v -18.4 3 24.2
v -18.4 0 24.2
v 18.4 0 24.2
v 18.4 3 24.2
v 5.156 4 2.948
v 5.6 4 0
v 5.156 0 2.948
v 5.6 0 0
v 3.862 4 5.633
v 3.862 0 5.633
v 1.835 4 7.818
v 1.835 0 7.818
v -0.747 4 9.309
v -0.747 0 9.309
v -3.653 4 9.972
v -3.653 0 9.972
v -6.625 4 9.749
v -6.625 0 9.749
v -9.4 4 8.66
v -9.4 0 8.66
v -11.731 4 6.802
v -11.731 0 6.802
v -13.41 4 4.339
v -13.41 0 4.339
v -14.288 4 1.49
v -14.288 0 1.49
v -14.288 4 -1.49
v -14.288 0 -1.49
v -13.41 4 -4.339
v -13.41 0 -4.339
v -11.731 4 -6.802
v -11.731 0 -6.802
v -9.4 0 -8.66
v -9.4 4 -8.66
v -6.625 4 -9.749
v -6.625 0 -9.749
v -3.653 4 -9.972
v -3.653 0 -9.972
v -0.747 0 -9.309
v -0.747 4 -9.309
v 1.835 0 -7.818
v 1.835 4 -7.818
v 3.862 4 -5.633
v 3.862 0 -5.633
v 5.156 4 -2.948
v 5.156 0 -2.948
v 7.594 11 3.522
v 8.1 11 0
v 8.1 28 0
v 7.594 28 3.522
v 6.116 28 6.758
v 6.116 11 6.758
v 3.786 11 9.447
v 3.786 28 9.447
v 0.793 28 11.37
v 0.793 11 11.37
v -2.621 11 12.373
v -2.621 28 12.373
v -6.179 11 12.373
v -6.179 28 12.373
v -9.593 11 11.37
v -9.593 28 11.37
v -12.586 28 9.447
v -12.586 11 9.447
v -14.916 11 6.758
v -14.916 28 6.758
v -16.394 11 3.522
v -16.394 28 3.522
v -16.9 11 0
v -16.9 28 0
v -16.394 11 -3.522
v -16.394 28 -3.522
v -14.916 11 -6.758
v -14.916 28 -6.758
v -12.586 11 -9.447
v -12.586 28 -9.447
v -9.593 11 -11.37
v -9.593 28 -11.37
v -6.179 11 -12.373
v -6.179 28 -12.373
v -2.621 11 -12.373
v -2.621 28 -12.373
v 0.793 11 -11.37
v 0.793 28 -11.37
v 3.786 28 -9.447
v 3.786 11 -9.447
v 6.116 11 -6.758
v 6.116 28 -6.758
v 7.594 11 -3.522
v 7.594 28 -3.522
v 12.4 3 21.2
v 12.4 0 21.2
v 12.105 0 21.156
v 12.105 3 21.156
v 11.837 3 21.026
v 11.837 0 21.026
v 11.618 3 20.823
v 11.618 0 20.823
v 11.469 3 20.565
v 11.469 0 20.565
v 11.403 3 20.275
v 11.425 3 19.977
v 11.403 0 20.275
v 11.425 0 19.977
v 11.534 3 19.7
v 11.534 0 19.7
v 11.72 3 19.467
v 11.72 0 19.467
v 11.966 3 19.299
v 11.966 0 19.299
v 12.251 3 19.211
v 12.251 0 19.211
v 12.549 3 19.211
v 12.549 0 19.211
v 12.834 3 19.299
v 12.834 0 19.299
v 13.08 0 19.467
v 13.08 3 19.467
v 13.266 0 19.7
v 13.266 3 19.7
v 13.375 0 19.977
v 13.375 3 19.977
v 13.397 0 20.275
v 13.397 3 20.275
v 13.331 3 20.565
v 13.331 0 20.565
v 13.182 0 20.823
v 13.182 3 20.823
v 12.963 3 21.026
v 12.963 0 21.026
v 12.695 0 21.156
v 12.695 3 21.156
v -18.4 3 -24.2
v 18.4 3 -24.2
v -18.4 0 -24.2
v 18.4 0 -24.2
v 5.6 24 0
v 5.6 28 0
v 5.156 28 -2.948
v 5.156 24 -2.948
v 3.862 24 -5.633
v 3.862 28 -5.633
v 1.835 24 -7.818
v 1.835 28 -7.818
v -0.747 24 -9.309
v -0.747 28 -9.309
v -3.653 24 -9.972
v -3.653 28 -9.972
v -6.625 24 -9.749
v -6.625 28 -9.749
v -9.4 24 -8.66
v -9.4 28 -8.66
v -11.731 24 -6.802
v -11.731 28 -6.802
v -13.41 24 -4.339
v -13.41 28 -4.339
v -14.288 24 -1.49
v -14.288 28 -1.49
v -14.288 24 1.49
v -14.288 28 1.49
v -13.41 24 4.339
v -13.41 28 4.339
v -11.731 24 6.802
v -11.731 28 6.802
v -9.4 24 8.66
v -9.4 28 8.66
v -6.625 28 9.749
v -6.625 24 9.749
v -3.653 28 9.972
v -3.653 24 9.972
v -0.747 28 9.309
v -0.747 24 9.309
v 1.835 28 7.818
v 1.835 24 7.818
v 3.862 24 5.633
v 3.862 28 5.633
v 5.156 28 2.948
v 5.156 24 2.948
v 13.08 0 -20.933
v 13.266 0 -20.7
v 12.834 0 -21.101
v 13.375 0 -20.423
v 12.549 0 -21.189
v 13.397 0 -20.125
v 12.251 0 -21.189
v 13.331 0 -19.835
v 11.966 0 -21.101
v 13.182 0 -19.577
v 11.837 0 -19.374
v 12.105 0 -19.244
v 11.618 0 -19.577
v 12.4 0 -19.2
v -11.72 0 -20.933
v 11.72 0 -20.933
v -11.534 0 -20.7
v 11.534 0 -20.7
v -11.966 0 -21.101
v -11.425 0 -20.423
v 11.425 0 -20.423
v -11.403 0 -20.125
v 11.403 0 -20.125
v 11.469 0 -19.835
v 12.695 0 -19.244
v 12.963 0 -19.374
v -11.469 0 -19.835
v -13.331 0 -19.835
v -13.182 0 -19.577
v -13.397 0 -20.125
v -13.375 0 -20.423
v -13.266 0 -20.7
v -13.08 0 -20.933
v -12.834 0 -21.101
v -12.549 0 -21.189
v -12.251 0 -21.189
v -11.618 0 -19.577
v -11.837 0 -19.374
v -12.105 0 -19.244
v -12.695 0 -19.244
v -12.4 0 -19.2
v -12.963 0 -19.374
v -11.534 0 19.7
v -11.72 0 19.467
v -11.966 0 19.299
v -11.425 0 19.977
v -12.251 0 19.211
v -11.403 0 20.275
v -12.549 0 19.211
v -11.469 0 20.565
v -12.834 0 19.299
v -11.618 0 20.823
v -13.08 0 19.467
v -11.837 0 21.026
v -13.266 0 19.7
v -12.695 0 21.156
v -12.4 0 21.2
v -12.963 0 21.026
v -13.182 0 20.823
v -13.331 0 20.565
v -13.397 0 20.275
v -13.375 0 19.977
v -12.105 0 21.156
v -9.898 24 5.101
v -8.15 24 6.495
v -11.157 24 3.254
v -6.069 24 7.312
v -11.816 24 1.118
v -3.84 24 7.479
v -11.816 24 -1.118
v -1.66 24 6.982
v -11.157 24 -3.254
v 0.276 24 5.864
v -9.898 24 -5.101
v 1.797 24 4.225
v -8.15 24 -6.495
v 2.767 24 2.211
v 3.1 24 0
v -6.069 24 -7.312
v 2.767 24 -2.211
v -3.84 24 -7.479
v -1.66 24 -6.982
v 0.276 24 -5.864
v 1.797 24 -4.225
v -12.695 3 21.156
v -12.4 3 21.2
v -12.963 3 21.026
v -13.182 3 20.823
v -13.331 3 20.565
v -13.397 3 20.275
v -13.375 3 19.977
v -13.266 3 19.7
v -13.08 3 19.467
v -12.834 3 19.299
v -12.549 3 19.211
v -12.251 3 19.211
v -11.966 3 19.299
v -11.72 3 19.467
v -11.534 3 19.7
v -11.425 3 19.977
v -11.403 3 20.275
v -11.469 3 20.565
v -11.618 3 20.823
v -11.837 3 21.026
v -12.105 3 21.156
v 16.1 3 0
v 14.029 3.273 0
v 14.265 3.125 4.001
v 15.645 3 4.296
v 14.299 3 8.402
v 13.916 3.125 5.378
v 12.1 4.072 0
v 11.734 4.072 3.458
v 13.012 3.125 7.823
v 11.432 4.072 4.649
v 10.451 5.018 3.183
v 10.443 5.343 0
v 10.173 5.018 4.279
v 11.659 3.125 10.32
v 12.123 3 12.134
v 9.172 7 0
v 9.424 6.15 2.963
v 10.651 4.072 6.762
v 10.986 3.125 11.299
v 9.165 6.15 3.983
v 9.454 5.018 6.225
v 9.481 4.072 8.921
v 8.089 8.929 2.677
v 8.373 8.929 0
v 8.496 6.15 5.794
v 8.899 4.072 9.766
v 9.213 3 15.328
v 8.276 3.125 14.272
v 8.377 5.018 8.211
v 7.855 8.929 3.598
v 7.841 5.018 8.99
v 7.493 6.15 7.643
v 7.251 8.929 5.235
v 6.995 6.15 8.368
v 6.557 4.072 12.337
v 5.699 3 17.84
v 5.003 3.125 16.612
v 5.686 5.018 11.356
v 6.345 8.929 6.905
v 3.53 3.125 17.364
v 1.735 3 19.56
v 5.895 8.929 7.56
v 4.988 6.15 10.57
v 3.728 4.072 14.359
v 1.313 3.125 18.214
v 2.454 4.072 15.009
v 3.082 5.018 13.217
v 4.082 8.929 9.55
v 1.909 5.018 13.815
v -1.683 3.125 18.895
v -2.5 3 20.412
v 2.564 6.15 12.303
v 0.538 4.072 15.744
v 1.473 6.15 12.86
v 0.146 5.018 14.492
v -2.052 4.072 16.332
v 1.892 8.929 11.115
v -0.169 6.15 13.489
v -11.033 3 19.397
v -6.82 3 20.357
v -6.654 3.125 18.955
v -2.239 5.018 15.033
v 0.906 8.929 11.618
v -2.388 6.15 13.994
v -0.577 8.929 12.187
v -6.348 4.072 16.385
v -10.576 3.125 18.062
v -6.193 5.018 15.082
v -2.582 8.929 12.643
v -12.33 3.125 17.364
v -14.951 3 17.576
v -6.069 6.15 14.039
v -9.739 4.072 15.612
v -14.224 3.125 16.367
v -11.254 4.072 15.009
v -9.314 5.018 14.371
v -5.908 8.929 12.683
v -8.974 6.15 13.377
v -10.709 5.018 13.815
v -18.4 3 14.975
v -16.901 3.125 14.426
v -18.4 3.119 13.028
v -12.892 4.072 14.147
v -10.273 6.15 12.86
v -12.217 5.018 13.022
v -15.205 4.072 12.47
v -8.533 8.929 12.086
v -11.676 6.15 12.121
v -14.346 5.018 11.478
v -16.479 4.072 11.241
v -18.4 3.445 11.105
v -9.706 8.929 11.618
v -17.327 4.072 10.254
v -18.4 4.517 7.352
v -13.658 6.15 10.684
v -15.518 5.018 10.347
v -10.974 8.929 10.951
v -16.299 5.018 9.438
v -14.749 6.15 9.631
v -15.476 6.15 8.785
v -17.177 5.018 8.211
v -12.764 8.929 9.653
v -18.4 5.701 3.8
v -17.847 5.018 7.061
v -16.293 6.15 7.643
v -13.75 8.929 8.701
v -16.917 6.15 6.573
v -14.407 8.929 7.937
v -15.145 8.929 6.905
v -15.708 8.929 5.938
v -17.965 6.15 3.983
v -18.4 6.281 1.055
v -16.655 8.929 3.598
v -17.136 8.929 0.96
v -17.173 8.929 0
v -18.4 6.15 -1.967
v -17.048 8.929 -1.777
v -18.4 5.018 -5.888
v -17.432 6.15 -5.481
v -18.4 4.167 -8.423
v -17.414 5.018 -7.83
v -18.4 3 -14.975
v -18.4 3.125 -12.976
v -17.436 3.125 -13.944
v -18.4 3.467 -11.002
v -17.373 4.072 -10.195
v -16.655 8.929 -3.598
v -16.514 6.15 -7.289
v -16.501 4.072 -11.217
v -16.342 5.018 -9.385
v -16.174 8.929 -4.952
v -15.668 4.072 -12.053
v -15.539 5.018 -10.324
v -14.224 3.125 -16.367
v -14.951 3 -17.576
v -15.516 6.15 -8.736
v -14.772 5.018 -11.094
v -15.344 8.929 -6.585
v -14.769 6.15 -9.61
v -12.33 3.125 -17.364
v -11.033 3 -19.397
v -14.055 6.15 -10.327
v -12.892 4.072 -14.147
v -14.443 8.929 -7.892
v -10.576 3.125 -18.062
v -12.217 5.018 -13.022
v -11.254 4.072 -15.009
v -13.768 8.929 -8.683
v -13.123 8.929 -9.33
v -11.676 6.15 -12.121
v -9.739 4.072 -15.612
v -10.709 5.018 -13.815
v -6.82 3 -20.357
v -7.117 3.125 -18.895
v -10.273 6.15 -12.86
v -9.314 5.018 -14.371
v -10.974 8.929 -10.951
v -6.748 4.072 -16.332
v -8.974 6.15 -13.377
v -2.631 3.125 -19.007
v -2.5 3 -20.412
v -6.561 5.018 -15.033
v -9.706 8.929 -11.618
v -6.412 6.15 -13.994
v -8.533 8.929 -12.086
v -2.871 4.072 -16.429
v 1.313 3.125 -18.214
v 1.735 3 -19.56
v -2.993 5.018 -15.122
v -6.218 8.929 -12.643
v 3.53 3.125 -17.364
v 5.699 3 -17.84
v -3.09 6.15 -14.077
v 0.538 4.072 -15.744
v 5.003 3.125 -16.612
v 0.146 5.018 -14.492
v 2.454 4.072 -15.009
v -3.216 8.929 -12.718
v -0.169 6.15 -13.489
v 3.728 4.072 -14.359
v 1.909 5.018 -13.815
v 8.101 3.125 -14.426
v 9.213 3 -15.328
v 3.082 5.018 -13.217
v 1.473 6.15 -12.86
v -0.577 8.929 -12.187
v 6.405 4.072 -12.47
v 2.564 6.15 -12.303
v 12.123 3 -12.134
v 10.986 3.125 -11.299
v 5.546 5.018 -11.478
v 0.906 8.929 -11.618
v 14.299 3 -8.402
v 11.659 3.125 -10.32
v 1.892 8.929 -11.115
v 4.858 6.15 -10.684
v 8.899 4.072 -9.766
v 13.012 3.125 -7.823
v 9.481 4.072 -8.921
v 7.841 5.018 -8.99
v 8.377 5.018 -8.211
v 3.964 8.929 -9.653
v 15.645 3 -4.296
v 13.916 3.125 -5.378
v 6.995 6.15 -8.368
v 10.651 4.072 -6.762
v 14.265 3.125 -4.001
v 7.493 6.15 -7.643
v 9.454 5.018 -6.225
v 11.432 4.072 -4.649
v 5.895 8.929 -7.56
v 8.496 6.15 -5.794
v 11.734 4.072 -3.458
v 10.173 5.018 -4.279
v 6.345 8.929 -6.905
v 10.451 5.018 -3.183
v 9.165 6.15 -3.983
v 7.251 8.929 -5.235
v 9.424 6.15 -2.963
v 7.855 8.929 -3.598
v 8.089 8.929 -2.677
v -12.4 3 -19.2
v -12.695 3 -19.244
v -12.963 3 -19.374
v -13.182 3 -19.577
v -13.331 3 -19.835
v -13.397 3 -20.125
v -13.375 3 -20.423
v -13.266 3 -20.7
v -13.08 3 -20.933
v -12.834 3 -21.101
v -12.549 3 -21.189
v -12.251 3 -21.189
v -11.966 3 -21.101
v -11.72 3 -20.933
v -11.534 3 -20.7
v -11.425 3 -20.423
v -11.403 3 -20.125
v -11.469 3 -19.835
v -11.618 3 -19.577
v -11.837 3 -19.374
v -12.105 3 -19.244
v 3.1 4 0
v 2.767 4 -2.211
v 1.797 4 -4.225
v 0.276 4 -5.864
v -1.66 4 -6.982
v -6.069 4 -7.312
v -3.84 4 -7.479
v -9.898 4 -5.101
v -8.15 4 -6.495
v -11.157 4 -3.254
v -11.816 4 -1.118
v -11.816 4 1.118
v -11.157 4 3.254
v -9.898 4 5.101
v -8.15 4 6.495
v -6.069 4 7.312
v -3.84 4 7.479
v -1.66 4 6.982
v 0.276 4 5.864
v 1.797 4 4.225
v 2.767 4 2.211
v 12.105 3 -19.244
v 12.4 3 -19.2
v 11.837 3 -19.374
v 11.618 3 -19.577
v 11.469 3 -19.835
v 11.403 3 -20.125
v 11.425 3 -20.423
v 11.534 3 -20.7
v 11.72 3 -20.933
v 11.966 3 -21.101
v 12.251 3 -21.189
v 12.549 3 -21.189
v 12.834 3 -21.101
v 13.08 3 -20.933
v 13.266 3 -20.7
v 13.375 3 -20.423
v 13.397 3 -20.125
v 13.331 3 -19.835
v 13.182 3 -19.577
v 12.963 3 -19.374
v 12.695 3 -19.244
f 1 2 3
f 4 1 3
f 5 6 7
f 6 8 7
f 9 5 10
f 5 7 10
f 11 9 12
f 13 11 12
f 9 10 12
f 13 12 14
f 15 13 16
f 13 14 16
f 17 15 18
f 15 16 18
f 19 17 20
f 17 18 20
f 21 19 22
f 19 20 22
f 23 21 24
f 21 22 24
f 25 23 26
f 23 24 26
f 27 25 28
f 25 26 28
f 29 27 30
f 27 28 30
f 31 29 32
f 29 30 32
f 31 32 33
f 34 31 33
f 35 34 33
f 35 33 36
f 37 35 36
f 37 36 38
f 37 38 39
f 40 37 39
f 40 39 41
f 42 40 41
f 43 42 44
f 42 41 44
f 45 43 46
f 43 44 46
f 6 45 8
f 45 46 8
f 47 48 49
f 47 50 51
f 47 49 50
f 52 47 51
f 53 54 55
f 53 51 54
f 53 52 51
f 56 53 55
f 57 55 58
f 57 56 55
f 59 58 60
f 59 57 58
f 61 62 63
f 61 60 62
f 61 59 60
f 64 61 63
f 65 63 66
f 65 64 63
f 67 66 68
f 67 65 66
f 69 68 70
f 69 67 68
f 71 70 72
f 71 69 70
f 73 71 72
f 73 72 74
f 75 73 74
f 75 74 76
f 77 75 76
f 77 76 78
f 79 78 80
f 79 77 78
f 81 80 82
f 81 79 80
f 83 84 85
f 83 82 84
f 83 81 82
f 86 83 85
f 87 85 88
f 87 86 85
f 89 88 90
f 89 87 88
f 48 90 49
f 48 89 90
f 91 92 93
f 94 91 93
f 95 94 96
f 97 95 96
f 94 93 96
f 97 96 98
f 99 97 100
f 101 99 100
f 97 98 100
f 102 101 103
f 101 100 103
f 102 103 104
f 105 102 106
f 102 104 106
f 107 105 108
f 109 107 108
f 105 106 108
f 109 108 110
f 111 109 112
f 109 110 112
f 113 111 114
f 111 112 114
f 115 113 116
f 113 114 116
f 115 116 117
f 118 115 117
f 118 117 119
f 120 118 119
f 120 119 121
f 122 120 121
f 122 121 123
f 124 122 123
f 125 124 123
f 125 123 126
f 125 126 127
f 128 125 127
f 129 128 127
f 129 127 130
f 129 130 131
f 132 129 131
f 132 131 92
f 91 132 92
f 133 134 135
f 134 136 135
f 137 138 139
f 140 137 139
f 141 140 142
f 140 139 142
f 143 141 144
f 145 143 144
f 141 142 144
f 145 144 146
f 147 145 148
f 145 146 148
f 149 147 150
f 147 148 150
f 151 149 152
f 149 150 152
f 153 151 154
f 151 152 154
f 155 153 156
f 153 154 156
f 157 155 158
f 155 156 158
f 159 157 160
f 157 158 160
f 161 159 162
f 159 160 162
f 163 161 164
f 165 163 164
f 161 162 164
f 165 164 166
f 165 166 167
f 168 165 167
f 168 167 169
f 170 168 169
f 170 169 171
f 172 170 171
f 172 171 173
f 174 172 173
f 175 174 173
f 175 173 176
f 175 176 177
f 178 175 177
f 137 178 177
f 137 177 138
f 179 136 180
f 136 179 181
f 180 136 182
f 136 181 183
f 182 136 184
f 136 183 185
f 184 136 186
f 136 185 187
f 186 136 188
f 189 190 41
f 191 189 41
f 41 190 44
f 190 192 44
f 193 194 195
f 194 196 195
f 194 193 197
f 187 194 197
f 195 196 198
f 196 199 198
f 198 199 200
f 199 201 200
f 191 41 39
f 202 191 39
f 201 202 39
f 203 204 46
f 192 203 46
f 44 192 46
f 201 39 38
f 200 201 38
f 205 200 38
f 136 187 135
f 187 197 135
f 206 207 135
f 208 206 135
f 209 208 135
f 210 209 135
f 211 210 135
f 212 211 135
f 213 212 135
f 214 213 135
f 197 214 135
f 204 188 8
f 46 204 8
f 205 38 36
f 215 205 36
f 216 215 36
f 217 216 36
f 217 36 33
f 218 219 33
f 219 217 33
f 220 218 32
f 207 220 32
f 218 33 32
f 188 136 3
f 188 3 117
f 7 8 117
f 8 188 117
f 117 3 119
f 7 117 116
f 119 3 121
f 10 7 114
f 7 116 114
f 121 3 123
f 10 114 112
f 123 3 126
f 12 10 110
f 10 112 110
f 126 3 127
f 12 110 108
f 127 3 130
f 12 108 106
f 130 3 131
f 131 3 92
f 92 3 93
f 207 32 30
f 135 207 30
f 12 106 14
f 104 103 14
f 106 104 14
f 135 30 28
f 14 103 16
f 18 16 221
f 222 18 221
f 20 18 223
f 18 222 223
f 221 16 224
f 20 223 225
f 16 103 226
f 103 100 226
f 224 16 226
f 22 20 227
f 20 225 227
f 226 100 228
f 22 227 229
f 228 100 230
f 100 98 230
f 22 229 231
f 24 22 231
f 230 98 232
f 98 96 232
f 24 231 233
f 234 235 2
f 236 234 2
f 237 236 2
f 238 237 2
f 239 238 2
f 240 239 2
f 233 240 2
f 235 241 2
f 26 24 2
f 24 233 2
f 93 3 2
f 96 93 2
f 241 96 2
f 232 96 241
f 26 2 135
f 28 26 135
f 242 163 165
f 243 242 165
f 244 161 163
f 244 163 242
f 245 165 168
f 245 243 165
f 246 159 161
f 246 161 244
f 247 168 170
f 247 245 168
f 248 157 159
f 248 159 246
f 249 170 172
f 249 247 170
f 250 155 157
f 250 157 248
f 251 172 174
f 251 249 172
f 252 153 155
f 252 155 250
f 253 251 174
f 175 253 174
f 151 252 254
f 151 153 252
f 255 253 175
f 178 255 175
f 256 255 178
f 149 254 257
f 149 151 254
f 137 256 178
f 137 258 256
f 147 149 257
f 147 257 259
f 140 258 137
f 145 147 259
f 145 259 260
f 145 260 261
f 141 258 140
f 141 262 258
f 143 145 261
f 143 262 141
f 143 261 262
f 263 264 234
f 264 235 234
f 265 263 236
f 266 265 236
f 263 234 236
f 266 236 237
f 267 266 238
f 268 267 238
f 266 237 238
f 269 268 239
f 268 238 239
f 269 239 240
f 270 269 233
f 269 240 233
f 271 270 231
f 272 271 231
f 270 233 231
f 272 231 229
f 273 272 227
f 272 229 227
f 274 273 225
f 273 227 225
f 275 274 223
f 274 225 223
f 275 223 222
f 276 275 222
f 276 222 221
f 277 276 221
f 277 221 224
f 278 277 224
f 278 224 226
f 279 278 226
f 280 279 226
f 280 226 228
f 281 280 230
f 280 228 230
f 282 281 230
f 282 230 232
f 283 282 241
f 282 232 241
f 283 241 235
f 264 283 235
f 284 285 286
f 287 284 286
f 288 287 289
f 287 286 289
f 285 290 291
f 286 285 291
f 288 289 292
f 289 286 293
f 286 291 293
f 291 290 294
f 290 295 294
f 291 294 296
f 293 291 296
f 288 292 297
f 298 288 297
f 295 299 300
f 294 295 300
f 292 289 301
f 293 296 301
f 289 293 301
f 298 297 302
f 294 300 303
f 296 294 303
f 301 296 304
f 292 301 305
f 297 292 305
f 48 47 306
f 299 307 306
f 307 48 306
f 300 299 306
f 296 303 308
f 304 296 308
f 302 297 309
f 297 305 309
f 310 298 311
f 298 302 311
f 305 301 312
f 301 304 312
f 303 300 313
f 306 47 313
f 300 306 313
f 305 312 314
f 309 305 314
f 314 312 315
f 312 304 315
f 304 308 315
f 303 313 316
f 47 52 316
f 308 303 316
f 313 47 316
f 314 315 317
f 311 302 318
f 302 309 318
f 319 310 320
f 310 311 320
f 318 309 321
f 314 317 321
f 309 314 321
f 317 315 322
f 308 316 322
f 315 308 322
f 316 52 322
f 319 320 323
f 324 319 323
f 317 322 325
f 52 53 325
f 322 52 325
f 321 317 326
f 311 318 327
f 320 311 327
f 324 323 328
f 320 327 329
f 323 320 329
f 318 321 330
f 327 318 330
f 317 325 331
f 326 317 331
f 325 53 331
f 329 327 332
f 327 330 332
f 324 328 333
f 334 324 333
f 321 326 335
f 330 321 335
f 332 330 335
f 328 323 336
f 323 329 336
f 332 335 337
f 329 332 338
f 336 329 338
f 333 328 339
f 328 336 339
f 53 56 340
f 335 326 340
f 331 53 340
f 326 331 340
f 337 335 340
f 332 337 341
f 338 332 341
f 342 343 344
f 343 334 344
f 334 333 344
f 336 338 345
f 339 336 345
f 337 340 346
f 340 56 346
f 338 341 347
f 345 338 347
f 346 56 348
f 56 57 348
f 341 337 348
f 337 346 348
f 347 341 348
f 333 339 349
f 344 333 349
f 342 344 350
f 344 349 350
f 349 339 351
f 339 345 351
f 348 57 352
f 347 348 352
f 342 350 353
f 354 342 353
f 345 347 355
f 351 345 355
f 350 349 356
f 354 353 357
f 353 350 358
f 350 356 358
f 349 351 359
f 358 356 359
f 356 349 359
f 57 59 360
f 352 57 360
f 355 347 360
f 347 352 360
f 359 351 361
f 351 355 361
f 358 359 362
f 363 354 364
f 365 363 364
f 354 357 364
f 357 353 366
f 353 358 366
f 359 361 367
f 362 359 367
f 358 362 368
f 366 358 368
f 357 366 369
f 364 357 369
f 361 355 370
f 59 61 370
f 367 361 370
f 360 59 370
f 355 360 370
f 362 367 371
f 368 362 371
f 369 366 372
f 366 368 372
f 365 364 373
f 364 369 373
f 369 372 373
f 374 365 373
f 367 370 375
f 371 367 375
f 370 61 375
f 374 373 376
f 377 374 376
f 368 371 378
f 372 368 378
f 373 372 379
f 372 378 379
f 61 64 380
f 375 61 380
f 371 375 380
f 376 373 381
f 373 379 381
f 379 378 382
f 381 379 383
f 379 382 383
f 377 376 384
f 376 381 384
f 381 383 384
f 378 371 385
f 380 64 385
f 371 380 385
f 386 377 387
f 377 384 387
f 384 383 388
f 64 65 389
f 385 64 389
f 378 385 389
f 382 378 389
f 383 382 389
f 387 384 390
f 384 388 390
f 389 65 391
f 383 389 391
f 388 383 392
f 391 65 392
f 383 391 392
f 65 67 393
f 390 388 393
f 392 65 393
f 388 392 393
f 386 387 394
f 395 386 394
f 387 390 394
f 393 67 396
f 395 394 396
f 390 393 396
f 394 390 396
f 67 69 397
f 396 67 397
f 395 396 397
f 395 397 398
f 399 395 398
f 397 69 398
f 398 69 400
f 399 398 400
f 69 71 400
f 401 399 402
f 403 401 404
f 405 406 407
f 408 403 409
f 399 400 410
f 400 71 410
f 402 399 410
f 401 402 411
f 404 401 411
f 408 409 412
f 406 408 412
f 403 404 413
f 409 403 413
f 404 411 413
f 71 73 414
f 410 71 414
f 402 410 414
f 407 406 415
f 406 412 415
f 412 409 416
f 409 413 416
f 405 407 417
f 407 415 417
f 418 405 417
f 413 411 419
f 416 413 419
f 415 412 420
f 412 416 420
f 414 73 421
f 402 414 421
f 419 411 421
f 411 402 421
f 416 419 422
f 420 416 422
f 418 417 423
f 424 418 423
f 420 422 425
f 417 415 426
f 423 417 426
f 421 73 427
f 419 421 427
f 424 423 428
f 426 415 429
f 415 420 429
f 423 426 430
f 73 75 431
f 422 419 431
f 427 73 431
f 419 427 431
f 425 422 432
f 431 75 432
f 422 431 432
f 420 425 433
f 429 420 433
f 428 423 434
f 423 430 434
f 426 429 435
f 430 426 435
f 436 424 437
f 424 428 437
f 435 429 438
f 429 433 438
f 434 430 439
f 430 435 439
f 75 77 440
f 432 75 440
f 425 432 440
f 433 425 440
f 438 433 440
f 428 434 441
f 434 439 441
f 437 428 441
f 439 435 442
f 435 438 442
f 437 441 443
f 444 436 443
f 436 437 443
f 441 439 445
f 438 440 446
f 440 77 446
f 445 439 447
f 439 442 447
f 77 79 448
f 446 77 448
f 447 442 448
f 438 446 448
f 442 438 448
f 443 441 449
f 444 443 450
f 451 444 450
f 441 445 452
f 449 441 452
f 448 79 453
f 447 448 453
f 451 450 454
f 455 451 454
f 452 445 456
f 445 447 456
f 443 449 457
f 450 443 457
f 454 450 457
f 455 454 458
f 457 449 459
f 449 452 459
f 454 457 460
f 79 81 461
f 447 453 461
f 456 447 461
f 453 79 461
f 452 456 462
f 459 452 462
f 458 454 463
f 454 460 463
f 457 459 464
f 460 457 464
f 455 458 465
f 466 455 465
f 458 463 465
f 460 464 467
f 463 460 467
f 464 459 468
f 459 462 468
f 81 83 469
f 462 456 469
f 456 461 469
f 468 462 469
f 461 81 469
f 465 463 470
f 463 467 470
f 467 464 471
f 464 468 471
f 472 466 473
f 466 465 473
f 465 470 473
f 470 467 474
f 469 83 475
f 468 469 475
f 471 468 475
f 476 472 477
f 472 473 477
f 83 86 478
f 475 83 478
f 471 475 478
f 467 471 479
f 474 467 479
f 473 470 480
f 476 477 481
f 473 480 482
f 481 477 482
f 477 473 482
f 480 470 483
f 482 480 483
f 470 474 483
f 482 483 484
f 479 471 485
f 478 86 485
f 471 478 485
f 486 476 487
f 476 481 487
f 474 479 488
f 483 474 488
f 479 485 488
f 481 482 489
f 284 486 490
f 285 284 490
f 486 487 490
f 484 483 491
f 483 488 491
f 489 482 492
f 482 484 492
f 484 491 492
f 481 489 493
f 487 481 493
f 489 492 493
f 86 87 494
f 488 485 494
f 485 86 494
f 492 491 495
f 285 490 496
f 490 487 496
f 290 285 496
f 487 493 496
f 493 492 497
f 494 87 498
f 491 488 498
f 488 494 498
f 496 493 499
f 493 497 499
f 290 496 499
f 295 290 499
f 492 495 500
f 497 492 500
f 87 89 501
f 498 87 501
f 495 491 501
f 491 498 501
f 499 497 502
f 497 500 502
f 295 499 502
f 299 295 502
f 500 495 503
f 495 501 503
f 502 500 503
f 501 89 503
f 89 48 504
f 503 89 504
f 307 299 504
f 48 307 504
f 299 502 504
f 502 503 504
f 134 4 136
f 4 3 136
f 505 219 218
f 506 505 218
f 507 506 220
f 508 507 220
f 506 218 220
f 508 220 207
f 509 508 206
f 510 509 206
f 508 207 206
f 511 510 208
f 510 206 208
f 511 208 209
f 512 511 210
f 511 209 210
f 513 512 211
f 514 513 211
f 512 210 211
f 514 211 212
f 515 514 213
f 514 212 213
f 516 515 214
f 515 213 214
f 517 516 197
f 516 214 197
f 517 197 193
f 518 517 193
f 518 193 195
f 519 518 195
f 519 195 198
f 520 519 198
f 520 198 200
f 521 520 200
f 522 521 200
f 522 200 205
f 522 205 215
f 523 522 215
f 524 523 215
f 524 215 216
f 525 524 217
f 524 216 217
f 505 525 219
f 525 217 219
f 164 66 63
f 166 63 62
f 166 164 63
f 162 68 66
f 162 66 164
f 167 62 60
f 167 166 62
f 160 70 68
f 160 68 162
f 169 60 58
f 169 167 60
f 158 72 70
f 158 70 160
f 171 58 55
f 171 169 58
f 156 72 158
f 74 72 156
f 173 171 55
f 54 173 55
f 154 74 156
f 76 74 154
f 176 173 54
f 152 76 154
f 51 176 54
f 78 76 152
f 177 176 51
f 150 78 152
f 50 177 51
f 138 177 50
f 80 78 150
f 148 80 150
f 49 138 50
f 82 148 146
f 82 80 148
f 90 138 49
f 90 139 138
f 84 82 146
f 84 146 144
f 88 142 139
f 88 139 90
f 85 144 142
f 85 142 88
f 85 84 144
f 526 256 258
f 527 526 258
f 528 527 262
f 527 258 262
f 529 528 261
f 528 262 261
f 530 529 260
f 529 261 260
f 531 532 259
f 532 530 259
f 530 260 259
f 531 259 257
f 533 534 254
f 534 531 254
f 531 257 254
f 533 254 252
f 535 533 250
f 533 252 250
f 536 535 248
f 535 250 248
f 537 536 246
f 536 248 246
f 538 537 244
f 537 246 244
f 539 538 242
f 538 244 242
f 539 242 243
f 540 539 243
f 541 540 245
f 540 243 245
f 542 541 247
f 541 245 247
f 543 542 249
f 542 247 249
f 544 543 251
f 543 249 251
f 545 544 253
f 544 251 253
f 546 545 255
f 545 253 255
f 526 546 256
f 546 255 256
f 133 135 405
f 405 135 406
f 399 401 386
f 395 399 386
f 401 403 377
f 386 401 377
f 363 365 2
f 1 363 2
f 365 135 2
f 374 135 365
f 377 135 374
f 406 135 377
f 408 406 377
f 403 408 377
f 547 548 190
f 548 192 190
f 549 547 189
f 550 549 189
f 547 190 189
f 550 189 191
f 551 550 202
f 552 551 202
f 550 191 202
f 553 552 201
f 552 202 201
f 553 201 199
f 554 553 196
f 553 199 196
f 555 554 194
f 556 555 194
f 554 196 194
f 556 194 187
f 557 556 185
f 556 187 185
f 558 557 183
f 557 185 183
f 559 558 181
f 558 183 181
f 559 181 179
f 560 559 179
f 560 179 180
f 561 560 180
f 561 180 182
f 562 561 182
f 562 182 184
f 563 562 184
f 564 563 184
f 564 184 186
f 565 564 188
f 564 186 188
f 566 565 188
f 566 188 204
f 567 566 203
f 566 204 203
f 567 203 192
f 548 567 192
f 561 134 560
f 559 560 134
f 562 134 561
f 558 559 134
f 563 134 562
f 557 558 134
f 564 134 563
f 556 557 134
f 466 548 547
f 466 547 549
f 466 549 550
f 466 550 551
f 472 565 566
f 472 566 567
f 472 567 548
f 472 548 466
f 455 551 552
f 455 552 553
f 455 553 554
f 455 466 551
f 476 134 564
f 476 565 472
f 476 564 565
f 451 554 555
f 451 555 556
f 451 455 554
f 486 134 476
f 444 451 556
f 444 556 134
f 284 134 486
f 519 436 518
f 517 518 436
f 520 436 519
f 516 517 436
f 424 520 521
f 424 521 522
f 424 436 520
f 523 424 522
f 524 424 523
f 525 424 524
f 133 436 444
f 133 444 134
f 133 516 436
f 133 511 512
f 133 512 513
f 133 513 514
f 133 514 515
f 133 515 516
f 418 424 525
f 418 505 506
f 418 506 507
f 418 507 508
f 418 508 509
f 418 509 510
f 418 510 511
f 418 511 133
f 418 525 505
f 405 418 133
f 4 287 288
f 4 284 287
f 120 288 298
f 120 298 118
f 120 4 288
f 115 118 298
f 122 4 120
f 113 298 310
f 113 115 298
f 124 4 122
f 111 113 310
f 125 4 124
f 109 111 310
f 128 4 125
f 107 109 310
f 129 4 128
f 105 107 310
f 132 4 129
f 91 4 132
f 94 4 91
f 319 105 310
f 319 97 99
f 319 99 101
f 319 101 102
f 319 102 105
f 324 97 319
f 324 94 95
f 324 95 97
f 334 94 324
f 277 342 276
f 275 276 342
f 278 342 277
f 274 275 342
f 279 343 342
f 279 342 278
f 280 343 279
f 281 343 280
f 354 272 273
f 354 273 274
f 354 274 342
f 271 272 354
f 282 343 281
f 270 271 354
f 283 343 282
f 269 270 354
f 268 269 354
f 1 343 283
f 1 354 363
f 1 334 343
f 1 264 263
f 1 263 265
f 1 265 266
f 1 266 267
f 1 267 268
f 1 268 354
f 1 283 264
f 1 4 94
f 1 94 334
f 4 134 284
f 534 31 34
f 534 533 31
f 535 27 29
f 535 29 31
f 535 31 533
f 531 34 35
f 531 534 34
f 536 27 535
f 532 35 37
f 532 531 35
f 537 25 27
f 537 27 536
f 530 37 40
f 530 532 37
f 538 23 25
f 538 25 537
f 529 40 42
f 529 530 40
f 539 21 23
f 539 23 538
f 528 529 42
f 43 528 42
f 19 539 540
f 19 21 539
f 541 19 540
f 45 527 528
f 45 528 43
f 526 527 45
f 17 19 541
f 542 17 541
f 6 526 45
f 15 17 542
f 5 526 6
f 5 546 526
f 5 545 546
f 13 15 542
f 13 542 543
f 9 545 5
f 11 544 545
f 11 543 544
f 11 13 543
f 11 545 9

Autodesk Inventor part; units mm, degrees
ref_plane "YZ Plane" through (0, 0, 0) normal (1, 0, 0) x (0, 1, 0)
ref_plane "XZ Plane" through (0, 0, 0) normal (0, 1, 0) x (-1, 0, 0)
ref_plane "XY Plane" through (0, 0, 0) normal (0, 0, 1) x (1, 0, 0)
sketch "Sketch1" plane through (0, 0, 0) normal (0, 1, 0) x (-1, 0, 0)
  line L0 (18.4, 24.2) -> (-18.4, 24.2)
  line L1 (-18.4, 24.2) -> (-18.4, -24.2)
  line L2 (-18.4, -24.2) -> (18.4, -24.2)
  line L3 (18.4, -24.2) -> (18.4, 24.2)
  point P0 (0, 0)
  point P1 (-18.4, 0)
  point P2 (0, -24.2)
  dimension "d0" = 48.4
  dimension "d1" = 36.8
extrude "Extrusion1" add sketch "Sketch1" along normal blind 3
sketch "Sketch2" plane through (0, 3, 0) normal (0, 1, 0) x (1, 0, 0)
  line L0 (-18.4, -24.2) -> (18.4, -24.2) projected
  line L1 (-18.4, 24.2) -> (-18.4, -24.2) projected
  line L2 (18.4, 24.2) -> (-18.4, 24.2) projected
  line L3 (18.4, -24.2) -> (18.4, 24.2) projected
  point P0 (0, 0)
  point P1 (-12.4, -20.2)
  point P2 (-12.4, 20.2)
  point P3 (12.4, -20.2)
  point P4 (12.4, 20.2)
  dimension "d4" = 4
  dimension "d5" = 6
  dimension "d6" = 6
  dimension "d7" = 4
  dimension "d8" = 6
  dimension "d9" = 4
  dimension "d10" = 6
  dimension "d11" = 4
hole "Hole1" at (-12.4, 3, 20.2) at (-12.4, 3, -20.2) at (12.4, 3, 20.2) at (12.4, 3, -20.2) direction (0, -1, 0) diameter 2 end through all
sketch "Sketch3" plane through (0, 3, 0) normal (0, 1, 0) x (1, 0, 0)
  line L0 (-18.4, 24.2) -> (-18.4, -24.2) projected
  line L1 (-18.4, -24.2) -> (18.4, -24.2) projected
  line L2 (18.4, 24.2) -> (-18.4, 24.2) projected
  circle A0 centre (-4.4, 0) radius 7.5
  circle A1 centre (-4.4, 0) radius 12.5
  point P0 (0, 0)
  dimension "d19" = 14
  dimension "d20" = 24.2
  dimension "d21" = 24.2
  dimension "d22" = 15
  dimension "d23" = 25
extrude "Extrusion2" add sketch "Sketch3" along normal blind 25
sketch "Sketch4" plane through (-4.4, 3, 0) normal (0, 1, 0) x (1, 0, 0)
  circle A0 centre (0, 0) radius 7.5
  point P0 (4.4, 0)
extrude "Extrusion3" cut sketch "Sketch4" against normal blind 35
sketch "Sketch5" plane through (-4.4, 28, 0) normal (0, 1, 0) x (1, 0, 0)
  circle A0 centre (0, 0) radius 10
  point P0 (4.4, 0)
  dimension "d29" = 20
extrude "Extrusion4" cut sketch "Sketch5" against normal blind 4
sketch "Sketch8" plane through (0, 0, 0) normal (0, -1, 0) x (1, 0, 0)
  circle A0 centre (-4.4, 0) radius 7.5 projected
  circle A1 centre (-4.4, 0) radius 10
  point P0 (0, 0)
  dimension "d32" = 20
extrude "Extrusion5" cut sketch "Sketch8" against normal blind 4
fillet "Fillet2" radius 8 1 edges at (-16.9, 3, 0)
equation "\"d20\" = d21"
properties part number "Tube"
